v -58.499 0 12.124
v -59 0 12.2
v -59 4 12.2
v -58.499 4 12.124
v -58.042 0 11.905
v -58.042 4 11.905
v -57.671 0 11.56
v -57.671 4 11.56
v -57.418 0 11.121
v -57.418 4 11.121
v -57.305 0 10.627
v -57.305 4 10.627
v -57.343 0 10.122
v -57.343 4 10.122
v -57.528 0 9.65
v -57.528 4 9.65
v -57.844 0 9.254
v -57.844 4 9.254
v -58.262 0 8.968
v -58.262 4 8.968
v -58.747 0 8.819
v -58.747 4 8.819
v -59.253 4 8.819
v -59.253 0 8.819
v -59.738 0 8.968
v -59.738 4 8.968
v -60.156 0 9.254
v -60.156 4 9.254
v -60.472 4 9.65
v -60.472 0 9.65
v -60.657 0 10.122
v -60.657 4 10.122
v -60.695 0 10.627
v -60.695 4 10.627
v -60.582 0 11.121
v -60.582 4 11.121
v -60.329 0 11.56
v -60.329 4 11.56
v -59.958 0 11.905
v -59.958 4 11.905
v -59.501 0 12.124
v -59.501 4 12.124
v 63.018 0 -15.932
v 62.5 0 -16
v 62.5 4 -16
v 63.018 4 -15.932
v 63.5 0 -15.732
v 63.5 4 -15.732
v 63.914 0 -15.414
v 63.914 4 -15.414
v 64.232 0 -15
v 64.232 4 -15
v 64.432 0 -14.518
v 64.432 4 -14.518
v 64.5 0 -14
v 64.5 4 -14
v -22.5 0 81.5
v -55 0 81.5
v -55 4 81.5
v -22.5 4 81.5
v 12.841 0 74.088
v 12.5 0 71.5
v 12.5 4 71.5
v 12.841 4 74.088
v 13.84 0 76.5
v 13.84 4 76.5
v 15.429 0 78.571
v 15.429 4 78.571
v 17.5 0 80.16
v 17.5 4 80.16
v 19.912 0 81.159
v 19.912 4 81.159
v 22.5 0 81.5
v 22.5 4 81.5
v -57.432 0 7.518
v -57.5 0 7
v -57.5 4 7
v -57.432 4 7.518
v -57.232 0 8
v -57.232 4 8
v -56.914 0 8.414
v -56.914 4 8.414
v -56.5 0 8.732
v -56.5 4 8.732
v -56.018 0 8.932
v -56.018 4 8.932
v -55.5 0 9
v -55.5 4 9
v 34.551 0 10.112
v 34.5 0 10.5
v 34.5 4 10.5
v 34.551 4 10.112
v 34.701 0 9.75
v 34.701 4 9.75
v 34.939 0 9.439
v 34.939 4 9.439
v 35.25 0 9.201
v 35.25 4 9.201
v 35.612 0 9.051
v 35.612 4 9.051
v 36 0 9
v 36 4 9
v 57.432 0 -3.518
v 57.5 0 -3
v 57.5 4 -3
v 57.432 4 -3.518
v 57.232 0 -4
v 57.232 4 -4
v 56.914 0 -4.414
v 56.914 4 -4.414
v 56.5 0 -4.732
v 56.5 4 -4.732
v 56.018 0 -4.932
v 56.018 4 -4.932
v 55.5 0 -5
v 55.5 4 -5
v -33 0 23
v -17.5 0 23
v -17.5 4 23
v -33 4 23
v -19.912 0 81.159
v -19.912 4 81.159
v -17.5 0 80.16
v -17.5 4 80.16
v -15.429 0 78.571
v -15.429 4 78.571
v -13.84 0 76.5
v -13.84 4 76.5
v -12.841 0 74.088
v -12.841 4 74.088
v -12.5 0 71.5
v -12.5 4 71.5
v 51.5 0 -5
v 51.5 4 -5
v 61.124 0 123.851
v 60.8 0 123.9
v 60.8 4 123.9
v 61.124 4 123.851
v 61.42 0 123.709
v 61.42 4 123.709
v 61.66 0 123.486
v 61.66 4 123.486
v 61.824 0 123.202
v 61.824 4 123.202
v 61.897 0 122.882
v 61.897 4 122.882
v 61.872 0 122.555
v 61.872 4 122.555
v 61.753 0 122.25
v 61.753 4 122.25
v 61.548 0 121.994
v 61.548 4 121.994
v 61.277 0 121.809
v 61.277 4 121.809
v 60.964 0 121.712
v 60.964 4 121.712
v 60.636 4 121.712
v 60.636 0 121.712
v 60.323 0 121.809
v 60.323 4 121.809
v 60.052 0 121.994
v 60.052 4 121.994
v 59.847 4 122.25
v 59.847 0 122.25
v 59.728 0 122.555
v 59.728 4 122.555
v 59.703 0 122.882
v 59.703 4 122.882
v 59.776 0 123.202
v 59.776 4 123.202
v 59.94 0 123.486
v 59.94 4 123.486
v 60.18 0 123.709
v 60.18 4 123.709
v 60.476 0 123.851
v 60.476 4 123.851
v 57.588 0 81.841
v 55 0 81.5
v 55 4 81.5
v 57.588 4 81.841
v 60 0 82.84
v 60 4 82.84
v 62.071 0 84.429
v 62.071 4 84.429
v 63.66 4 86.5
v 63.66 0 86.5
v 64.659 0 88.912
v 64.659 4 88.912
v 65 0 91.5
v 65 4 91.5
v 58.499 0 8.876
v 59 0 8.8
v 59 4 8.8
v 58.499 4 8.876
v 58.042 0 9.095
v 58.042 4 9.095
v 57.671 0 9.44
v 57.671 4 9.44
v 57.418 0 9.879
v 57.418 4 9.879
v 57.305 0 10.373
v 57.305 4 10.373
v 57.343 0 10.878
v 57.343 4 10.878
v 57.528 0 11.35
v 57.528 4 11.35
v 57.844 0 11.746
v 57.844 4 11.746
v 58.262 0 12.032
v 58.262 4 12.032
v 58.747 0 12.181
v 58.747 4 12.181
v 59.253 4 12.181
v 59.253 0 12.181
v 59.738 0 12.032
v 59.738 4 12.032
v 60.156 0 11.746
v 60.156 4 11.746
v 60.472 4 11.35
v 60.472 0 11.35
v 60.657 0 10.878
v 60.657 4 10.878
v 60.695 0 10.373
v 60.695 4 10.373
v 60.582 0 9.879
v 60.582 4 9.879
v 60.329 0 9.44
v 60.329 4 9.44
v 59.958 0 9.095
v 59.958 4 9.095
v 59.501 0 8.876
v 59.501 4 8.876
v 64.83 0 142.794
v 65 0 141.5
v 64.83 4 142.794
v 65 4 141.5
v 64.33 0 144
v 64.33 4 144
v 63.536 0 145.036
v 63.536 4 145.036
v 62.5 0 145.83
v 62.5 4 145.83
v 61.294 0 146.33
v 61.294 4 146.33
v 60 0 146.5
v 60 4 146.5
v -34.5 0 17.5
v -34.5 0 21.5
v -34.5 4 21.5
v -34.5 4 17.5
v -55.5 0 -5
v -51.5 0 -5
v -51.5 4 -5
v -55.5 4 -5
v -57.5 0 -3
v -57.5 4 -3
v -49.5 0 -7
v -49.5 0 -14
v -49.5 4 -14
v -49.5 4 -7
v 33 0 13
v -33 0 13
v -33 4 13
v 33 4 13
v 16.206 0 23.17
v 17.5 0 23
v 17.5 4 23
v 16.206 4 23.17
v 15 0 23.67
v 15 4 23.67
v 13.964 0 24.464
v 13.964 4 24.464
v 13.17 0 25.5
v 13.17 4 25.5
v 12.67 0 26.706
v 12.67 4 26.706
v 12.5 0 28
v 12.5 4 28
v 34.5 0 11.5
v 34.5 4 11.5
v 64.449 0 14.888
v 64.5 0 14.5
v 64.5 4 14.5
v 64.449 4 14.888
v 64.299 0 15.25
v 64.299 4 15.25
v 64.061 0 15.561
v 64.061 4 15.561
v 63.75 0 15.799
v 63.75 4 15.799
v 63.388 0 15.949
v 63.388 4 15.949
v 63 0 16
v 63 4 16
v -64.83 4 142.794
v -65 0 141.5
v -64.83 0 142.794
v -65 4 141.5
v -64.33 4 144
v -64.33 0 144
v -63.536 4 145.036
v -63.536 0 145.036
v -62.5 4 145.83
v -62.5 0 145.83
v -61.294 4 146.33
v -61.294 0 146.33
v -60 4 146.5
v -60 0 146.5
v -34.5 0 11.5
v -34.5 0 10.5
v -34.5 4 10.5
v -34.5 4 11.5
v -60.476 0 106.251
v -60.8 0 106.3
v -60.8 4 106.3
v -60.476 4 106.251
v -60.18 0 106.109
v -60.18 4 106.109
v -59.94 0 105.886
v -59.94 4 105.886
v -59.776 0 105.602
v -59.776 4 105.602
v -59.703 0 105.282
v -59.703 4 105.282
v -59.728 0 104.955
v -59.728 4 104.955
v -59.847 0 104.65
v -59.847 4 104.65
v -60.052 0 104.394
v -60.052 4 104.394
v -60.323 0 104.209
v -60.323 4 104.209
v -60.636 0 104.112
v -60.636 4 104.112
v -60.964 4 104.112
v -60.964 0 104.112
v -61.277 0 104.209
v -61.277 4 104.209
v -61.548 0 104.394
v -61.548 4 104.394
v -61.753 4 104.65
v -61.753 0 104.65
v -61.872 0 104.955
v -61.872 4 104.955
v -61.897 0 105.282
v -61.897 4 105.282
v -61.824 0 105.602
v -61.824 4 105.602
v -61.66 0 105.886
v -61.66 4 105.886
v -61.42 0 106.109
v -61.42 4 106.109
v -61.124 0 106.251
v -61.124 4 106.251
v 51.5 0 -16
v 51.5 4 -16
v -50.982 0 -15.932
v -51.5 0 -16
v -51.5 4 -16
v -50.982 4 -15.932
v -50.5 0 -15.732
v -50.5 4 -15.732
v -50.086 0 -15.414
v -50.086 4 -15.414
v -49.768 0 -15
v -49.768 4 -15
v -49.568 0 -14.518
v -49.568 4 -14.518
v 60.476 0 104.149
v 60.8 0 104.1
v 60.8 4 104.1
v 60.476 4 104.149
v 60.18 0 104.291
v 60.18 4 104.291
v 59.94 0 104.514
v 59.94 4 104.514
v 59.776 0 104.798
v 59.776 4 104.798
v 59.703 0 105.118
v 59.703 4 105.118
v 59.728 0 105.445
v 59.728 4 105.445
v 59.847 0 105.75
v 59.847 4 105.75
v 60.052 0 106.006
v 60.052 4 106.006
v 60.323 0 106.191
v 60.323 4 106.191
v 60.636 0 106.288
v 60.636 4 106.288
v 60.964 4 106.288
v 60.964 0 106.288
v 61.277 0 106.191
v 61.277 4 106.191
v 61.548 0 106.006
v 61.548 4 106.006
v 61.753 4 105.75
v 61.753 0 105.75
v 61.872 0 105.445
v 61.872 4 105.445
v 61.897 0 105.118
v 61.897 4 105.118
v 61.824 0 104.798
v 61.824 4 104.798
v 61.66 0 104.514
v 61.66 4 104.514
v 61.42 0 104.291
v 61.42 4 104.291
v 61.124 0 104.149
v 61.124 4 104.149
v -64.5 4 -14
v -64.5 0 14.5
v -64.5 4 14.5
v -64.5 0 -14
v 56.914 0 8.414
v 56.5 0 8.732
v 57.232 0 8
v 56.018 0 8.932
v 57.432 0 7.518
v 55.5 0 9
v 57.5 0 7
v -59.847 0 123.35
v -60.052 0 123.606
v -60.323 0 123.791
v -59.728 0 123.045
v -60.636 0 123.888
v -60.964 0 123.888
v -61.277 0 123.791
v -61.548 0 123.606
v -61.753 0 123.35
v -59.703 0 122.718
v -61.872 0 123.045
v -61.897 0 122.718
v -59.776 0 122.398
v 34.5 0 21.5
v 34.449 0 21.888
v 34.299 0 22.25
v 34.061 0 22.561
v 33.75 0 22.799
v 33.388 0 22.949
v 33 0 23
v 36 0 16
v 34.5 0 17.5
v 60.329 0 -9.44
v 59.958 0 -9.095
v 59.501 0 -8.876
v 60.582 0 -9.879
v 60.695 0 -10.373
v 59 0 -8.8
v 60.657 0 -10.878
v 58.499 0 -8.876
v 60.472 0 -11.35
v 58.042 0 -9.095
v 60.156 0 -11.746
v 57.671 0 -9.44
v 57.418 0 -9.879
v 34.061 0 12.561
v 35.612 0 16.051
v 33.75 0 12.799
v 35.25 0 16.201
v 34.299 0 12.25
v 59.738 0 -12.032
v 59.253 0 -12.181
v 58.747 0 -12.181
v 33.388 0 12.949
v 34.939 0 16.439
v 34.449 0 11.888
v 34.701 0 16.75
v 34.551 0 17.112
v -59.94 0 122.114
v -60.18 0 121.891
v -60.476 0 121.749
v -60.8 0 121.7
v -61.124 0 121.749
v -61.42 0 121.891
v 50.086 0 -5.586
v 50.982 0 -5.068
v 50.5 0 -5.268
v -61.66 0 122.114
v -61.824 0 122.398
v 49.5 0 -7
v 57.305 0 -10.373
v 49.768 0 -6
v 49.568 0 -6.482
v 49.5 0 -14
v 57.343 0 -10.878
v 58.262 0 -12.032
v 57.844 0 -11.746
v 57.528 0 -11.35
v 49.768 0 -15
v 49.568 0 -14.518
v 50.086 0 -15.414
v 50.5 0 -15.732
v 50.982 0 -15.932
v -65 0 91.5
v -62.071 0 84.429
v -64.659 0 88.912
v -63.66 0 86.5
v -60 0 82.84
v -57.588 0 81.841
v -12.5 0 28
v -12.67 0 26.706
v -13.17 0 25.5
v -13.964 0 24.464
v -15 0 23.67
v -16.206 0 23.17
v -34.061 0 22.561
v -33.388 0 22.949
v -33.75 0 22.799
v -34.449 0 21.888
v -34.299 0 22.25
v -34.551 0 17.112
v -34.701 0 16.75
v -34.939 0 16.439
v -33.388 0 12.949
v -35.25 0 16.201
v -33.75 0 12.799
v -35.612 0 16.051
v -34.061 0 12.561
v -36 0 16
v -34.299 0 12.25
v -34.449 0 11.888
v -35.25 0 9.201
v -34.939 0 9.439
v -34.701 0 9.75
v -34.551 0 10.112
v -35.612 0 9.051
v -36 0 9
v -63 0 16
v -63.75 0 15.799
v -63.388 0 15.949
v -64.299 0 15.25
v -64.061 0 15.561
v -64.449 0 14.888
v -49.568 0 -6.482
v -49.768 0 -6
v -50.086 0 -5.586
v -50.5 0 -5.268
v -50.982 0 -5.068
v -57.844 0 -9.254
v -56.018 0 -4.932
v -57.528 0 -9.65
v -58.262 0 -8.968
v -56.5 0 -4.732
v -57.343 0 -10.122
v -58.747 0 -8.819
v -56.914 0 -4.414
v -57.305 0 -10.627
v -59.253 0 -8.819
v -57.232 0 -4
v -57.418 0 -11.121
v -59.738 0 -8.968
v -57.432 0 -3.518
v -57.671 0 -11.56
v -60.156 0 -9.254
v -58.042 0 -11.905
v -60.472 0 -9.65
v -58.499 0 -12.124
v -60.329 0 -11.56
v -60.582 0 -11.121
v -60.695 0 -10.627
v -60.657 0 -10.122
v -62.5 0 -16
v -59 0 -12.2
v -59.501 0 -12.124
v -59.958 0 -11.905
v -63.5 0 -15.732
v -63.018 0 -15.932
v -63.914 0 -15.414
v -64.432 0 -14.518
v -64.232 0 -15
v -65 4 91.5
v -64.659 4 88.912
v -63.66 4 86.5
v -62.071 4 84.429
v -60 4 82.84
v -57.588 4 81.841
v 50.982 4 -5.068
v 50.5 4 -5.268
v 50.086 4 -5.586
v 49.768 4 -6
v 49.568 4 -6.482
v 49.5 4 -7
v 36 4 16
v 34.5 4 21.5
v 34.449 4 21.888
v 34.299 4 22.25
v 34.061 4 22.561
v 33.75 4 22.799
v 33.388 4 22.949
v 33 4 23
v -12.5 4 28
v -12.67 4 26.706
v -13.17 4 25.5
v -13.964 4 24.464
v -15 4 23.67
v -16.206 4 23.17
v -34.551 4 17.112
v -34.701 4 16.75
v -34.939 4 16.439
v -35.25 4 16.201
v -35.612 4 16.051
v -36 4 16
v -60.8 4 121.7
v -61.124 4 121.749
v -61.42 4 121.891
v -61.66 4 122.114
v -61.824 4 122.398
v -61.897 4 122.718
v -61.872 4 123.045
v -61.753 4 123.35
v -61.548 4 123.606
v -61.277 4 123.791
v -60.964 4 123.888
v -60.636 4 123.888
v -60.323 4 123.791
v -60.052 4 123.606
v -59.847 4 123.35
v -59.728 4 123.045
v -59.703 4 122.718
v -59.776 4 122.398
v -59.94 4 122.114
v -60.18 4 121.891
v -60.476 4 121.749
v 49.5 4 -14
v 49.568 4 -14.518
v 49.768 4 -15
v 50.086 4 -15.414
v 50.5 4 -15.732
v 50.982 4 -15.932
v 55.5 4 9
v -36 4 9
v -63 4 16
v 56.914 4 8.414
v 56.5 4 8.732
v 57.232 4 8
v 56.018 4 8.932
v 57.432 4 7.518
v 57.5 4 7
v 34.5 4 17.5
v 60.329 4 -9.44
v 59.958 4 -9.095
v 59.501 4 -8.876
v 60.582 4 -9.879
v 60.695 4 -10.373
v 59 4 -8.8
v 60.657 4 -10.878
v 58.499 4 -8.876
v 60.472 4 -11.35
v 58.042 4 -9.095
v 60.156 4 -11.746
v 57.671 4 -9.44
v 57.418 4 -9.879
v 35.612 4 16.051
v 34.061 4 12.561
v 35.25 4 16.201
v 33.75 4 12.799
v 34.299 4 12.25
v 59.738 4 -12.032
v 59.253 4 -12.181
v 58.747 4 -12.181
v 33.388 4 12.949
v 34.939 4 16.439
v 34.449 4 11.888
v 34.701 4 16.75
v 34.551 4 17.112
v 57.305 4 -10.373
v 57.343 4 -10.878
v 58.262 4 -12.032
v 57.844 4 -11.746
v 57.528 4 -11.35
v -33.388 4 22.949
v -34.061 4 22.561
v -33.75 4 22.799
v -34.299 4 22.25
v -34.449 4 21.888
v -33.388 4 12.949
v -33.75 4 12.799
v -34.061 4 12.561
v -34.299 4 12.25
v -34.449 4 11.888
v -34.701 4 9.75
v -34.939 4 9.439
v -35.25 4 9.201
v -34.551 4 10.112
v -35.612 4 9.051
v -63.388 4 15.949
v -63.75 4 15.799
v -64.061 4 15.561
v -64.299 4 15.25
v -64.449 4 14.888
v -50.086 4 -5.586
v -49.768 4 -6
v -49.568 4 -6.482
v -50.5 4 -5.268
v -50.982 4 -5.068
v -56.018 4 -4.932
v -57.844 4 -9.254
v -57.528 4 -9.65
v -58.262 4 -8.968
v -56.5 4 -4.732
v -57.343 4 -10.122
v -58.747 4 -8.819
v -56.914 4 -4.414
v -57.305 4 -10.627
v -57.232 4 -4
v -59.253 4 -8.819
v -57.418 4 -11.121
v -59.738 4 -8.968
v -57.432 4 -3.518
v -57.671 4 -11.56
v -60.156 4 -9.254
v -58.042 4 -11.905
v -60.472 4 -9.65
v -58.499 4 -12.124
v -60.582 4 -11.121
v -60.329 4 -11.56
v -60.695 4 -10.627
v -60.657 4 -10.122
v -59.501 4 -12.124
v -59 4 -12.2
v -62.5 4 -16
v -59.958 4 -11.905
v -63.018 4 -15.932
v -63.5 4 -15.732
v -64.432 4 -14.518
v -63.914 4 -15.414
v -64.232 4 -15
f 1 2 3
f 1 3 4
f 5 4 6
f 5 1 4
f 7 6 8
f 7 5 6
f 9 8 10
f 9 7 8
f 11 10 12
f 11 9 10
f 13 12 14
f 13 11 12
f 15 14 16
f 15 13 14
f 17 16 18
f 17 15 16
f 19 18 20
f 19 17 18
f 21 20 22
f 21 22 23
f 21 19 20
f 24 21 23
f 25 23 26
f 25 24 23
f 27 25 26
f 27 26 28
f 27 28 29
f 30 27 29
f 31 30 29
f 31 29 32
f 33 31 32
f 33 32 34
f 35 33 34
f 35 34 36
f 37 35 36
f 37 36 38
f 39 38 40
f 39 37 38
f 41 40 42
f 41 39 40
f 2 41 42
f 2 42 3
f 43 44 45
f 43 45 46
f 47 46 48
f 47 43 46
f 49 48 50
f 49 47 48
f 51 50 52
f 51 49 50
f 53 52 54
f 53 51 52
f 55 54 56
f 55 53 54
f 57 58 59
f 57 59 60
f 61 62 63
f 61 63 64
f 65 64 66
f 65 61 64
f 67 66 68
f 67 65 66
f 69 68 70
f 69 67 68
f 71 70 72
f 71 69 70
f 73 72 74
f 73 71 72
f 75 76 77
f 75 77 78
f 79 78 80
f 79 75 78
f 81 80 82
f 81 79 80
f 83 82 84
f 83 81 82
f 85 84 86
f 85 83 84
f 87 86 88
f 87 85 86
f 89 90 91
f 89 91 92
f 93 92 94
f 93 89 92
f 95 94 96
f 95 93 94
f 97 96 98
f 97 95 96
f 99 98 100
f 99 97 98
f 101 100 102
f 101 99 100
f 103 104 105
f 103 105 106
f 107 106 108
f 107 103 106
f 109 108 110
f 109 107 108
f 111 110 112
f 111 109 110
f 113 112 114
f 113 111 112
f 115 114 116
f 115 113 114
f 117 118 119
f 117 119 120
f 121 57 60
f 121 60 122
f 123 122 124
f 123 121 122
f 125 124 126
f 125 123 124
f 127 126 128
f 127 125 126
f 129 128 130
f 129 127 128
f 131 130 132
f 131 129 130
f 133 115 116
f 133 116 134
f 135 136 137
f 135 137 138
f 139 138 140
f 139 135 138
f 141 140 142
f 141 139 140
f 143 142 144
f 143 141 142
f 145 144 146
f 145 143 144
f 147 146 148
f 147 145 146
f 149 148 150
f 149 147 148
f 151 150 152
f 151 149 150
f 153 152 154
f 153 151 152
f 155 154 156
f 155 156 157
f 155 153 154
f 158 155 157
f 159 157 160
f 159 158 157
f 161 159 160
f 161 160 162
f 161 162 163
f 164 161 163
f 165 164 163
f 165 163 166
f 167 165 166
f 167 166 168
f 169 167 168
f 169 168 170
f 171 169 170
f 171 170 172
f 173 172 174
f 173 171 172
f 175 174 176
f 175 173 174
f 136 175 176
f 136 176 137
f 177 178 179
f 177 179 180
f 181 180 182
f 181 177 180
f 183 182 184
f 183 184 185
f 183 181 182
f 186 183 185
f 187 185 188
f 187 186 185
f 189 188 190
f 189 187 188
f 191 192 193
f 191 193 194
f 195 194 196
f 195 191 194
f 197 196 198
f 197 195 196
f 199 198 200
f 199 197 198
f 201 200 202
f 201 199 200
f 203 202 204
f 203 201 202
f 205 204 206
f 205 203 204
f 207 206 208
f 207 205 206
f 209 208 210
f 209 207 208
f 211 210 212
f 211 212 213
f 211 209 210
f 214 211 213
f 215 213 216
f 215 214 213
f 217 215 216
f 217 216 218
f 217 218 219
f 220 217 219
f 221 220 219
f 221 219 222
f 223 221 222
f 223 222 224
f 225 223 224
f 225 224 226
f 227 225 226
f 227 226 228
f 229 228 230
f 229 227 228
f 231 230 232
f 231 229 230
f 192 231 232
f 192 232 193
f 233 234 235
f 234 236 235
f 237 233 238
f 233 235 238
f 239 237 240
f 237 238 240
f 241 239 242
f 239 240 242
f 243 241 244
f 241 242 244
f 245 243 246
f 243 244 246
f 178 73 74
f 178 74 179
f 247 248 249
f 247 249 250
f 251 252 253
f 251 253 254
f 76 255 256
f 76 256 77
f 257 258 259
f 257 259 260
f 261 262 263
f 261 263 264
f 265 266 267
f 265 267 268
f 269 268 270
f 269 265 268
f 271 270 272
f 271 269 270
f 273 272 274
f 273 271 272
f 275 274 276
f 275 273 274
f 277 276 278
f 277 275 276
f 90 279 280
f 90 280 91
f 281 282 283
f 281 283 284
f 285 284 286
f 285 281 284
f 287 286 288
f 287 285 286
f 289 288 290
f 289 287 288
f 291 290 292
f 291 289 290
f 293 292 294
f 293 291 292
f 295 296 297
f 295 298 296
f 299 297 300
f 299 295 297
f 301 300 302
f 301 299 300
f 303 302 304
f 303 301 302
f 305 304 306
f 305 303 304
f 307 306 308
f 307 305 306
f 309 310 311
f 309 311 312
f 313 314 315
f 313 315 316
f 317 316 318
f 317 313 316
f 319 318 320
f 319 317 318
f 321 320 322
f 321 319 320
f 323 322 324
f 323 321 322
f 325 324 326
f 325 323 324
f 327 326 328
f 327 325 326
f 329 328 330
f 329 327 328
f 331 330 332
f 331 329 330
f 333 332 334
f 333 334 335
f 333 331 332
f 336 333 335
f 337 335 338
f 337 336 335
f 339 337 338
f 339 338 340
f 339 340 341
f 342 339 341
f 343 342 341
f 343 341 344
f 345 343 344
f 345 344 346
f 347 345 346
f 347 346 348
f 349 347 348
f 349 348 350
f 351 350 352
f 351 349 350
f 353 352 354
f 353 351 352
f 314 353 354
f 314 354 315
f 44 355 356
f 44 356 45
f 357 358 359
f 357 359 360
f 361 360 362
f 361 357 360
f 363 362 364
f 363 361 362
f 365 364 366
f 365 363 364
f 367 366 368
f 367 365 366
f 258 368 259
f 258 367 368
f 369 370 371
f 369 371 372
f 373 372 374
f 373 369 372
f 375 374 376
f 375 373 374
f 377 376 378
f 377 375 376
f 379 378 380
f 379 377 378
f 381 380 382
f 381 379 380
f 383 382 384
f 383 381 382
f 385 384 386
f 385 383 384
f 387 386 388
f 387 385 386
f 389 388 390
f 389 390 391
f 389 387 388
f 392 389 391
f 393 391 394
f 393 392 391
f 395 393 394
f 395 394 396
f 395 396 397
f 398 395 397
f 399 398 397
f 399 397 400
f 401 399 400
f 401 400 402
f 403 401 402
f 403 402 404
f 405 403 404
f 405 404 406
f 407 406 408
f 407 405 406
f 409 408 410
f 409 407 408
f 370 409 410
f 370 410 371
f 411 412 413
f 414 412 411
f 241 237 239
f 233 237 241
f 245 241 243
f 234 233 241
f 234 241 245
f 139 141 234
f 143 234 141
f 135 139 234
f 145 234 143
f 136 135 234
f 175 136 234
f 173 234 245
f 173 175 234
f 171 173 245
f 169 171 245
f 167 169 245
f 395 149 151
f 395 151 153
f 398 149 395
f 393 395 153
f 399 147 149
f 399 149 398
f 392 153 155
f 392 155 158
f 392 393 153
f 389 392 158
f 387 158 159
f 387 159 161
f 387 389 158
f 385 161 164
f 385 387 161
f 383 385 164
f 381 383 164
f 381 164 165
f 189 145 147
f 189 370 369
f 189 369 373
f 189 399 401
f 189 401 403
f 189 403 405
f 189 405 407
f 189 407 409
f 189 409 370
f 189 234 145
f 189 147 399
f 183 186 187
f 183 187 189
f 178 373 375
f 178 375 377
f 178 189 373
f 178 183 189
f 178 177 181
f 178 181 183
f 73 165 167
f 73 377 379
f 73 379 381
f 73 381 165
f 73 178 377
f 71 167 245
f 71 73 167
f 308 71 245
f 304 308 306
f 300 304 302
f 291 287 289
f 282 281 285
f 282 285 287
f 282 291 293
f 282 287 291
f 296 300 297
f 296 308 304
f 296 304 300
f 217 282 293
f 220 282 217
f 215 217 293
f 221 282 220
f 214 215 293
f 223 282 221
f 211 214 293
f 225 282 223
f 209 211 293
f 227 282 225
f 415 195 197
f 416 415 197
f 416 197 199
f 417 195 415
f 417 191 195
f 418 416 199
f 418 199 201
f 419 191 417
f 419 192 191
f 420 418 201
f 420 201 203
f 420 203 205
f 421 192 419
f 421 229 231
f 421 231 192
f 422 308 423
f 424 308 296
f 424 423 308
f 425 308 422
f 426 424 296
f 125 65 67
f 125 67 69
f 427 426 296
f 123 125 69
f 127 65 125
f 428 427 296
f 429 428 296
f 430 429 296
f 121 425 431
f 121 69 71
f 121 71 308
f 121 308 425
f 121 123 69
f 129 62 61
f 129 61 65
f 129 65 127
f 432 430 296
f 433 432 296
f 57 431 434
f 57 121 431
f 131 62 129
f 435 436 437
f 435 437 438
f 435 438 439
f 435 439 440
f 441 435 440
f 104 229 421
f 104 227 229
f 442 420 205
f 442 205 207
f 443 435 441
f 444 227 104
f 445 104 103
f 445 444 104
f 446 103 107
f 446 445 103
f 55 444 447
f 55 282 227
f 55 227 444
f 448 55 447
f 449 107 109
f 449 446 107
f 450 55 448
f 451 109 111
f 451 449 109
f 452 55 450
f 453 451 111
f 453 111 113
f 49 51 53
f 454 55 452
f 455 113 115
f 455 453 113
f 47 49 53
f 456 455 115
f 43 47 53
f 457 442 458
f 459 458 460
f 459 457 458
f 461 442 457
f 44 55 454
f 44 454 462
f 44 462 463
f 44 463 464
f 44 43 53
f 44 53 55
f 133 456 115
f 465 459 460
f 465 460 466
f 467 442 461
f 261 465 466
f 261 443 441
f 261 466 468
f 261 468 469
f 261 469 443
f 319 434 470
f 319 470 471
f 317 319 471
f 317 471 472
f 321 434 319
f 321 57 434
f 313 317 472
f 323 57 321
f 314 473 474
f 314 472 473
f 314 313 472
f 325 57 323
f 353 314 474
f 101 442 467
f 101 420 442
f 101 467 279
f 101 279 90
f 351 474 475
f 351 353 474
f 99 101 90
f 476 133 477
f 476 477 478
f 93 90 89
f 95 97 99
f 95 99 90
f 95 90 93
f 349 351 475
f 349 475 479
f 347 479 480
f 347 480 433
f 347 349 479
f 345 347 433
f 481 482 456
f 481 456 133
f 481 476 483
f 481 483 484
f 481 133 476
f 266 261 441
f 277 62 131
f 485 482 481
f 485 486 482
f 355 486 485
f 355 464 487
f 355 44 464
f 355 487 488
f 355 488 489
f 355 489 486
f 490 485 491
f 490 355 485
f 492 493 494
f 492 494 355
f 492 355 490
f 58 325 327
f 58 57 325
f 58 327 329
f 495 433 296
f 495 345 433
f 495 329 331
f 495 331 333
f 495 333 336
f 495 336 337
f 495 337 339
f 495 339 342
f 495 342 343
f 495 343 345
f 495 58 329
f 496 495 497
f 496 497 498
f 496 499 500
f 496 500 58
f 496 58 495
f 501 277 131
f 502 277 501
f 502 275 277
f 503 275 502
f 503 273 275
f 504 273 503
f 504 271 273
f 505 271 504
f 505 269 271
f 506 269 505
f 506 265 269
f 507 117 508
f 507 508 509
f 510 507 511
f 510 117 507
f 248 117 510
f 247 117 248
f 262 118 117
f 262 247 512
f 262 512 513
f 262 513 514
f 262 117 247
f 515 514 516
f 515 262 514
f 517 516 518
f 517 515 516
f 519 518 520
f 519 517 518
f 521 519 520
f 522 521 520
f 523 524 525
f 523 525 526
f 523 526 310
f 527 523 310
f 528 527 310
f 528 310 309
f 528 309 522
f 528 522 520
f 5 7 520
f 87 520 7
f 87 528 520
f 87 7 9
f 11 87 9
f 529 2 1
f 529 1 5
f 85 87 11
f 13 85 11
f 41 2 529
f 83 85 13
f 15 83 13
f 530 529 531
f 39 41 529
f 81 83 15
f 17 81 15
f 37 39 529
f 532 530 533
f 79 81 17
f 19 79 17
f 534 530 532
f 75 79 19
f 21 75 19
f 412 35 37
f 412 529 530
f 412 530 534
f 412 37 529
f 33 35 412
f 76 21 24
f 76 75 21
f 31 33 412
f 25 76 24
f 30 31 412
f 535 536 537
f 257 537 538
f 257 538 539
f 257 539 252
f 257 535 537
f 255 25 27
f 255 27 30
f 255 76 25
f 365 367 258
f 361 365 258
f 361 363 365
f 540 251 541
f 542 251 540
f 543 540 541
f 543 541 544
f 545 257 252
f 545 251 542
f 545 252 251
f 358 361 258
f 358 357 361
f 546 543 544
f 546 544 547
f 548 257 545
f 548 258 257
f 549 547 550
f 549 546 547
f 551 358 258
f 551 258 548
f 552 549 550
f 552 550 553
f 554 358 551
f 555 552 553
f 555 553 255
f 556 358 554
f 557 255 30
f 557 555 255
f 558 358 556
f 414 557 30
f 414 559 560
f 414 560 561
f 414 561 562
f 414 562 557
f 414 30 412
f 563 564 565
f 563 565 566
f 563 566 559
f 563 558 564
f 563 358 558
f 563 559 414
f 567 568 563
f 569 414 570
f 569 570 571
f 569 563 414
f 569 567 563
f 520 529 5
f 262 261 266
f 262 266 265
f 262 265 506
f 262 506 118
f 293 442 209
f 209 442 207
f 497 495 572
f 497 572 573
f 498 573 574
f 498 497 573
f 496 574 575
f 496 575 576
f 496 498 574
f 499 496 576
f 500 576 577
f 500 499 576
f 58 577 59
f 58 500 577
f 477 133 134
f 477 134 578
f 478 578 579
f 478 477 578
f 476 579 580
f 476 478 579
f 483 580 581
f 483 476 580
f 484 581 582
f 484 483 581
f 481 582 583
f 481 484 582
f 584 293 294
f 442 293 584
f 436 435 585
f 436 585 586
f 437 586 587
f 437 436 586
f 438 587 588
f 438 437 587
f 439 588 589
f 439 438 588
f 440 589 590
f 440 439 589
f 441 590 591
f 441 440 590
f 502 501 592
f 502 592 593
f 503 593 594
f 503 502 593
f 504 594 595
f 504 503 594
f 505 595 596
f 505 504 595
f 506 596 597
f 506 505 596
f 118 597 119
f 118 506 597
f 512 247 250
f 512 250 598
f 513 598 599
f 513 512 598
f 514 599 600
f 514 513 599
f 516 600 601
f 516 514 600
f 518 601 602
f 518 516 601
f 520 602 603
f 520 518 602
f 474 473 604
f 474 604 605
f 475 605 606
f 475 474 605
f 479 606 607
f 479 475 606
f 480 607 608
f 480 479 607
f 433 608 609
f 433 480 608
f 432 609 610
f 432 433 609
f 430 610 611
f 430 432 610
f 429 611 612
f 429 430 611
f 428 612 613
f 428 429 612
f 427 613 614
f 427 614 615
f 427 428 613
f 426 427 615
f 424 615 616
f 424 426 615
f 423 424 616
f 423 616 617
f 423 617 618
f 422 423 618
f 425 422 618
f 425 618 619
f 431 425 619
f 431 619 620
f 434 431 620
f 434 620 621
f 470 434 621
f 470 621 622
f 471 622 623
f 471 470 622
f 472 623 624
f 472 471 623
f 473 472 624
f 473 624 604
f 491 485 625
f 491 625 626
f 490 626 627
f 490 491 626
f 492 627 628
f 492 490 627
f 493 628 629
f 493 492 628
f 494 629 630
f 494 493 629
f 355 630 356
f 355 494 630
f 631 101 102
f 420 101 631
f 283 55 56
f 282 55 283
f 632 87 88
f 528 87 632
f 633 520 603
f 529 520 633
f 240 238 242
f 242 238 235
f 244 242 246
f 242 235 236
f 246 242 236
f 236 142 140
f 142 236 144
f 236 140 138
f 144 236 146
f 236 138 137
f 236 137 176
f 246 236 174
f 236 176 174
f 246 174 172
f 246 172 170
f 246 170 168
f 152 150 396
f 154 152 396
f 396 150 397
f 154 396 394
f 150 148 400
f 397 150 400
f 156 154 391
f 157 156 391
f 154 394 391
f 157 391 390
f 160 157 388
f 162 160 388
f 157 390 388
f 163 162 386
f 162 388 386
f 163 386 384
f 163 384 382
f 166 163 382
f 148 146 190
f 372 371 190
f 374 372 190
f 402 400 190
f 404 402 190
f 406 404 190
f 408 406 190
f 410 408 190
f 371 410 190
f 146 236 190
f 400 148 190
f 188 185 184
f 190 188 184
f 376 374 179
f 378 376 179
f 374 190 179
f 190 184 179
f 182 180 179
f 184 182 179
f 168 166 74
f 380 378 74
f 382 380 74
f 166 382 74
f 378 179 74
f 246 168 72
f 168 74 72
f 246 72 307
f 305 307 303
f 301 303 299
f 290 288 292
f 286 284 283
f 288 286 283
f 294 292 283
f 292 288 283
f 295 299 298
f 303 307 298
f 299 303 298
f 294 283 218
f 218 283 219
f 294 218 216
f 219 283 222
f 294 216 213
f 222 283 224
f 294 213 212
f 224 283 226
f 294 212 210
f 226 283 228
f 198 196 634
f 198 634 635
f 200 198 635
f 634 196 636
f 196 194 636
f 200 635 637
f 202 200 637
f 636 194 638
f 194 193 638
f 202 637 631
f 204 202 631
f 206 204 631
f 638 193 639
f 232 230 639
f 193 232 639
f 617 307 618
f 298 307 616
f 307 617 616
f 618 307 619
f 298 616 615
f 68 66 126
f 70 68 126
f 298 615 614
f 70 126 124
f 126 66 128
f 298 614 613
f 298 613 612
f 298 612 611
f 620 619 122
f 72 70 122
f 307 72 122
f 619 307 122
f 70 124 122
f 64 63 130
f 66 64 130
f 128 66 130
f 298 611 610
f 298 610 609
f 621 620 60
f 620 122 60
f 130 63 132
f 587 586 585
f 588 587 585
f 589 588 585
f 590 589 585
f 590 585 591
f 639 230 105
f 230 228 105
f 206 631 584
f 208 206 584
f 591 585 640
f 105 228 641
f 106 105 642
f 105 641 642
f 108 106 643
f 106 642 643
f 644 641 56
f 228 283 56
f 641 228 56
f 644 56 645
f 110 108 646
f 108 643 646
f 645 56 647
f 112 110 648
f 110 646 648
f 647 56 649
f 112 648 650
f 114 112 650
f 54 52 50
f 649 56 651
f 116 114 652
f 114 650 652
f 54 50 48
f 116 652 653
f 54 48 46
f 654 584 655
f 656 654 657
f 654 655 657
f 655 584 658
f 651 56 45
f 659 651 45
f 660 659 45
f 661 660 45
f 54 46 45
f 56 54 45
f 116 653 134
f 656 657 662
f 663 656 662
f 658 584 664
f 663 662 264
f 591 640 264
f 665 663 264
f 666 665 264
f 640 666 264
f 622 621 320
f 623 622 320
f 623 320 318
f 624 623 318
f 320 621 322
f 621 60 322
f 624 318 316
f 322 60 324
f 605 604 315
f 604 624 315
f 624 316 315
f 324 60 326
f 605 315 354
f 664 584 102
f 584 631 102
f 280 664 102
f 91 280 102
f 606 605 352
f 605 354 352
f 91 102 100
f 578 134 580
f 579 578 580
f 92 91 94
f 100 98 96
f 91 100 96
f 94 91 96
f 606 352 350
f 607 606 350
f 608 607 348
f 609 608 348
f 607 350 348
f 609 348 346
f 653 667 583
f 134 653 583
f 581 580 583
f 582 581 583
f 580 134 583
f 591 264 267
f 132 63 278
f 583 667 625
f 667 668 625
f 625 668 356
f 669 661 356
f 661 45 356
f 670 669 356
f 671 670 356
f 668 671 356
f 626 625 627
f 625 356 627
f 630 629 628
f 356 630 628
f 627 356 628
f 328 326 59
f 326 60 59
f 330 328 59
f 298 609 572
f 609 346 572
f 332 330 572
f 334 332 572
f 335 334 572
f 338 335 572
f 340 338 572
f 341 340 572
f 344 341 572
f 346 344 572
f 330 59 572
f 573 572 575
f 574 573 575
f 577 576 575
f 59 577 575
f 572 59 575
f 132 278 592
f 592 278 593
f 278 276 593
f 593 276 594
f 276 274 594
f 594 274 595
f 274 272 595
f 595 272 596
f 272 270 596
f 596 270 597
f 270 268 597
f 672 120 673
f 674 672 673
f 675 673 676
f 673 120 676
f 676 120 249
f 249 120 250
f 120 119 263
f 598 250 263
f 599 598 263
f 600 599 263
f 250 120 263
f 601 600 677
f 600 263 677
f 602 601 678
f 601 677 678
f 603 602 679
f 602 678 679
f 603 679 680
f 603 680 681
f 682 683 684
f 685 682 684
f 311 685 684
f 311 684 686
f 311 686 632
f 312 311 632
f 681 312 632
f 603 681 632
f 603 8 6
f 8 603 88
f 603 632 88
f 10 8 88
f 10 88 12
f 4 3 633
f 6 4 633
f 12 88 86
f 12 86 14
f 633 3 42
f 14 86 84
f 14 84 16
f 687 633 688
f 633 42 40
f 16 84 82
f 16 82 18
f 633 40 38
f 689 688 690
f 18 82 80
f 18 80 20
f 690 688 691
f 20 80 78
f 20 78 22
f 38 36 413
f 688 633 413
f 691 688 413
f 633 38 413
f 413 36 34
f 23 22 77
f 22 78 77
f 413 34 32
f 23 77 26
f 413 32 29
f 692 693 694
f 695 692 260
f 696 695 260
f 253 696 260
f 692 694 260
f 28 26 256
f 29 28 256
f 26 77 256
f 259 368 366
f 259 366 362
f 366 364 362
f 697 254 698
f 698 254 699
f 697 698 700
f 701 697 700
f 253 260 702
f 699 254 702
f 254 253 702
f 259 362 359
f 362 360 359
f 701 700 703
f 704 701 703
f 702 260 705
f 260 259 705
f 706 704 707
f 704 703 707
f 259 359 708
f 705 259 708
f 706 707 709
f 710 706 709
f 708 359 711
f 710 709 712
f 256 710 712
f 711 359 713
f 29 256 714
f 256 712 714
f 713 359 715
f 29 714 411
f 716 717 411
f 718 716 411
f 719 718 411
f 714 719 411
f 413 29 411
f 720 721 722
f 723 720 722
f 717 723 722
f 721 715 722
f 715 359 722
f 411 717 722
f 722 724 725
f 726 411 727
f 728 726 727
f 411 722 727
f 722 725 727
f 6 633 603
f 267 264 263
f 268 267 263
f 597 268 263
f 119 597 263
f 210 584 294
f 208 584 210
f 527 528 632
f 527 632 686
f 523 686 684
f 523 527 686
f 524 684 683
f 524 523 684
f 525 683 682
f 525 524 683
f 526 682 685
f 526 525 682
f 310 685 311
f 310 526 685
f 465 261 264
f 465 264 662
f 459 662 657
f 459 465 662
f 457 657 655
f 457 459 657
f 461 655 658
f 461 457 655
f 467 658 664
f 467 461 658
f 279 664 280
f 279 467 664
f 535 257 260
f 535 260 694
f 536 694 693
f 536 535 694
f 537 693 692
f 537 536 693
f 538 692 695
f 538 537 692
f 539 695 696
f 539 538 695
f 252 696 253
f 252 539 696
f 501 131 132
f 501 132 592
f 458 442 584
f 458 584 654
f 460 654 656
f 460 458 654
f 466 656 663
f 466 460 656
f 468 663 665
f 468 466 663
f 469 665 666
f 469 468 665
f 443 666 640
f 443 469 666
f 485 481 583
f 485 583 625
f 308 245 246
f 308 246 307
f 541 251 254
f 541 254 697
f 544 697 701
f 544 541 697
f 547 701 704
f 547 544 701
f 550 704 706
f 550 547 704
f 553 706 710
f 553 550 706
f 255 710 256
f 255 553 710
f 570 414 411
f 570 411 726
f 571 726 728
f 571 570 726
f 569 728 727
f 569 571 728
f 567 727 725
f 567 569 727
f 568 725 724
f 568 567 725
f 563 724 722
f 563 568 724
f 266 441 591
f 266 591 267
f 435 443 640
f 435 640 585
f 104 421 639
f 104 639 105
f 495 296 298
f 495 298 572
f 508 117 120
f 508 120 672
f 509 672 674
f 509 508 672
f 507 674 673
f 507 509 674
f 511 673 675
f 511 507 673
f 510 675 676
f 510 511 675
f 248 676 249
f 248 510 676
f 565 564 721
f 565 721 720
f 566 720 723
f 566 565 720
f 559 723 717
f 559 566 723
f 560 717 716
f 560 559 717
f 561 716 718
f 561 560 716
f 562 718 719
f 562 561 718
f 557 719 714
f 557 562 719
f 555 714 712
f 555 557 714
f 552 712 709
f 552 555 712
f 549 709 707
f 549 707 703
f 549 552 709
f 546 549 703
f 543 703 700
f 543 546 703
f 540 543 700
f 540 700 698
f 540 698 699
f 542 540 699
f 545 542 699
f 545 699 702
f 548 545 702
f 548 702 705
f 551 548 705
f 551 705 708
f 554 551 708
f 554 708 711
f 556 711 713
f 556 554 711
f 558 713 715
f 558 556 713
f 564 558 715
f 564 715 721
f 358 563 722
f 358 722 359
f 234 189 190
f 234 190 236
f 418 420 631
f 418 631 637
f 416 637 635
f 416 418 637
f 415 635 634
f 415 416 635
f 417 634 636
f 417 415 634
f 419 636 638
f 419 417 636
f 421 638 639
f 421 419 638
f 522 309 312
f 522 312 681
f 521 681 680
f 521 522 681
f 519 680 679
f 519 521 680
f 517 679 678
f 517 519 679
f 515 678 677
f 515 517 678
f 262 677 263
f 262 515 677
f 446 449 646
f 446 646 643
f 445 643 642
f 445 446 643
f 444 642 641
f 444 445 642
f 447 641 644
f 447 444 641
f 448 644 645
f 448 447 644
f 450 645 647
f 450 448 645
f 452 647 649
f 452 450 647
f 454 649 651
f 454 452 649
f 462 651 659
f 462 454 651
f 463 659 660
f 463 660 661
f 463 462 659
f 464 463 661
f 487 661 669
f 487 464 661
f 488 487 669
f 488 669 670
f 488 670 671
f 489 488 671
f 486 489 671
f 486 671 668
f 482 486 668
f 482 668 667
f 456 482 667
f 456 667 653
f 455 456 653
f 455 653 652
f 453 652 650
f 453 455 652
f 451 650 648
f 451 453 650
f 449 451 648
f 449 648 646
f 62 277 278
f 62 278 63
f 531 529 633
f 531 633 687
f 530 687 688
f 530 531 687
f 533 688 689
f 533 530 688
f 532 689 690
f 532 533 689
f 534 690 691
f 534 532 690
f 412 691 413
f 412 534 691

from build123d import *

# Parameters (mm, degrees)
SKETCH2_R           = 1.7
SKETCH2_R_2         = 1.1
BOSS_EXTRUDE1_DEPTH = 4
FILLET1_R           = 5


with BuildPart() as part:
    # Sketch2 → Boss-Extrude1 (new body)
    with BuildSketch(Plane(origin=(0, 0, 0), x_dir=(1, 0, 0), z_dir=(0, 1, 0))):
        with BuildLine():
            Line((-33, -13), (33, -13))
            ThreePointArc((33, -13), (34.060660172, -12.560660172), (34.5, -11.5))
            Line((34.5, -11.5), (34.5, -10.5))
            ThreePointArc((34.5, -10.5), (34.939339828, -9.439339828), (36, -9))
            Line((36, -9), (55.5, -9))
            ThreePointArc((55.5, -9), (56.914213562, -8.414213562), (57.5, -7))
            Line((57.5, -7), (57.5, 3))
            ThreePointArc((57.5, 3), (56.914213562, 4.414213562), (55.5, 5))
            Line((55.5, 5), (51.5, 5))
            ThreePointArc((51.5, 5), (50.085786438, 5.585786438), (49.5, 7))
            Line((49.5, 7), (49.5, 14))
            ThreePointArc((49.5, 14), (50.085786438, 15.414213562), (51.5, 16))
            Line((51.5, 16), (62.5, 16))
            ThreePointArc((62.5, 16), (63.914213562, 15.414213562), (64.5, 14))
            Line((64.5, 14), (64.5, -13))
            Line((64.5, -13), (64.5, -14.5))
            ThreePointArc((64.5, -14.5), (64.060660172, -15.560660172), (63, -16))
            Line((63, -16), (36, -16))
            ThreePointArc((36, -16), (34.939339828, -16.439339828), (34.5, -17.5))
            Line((34.5, -17.5), (34.5, -21.5))
            ThreePointArc((34.5, -21.5), (34.060660172, -22.560660172), (33, -23))
            Line((33, -23), (17.5, -23))
            ThreePointArc((17.5, -23), (13.964466094, -24.464466094), (12.5, -28))
            Line((12.5, -28), (12.5, -56.5))
            Line((12.5, -56.5), (12.5, -71.5))
            ThreePointArc((12.5, -71.5), (15.428932188, -78.571067812), (22.5, -81.5))
            Line((22.5, -81.5), (55, -81.5))
            ThreePointArc((55, -81.5), (62.071067812, -84.428932188), (65, -91.5))
            Line((65, -91.5), (65, -146.5))
            Line((65, -146.5), (-65, -146.5))
            Line((-65, -146.5), (-65, -91.5))
            ThreePointArc((-65, -91.5), (-62.071067812, -84.428932188), (-55, -81.5))
            Line((-55, -81.5), (-25, -81.5))
            Line((-25, -81.5), (-22.5, -81.5))
            ThreePointArc((-22.5, -81.5), (-15.428932188, -78.571067812), (-12.5, -71.5))
            Line((-12.5, -71.5), (-12.5, -56.5))
            Line((-12.5, -56.5), (-12.5, -28))
            ThreePointArc((-12.5, -28), (-13.964466094, -24.464466094), (-17.5, -23))
            Line((-17.5, -23), (-33, -23))
            ThreePointArc((-33, -23), (-34.060660172, -22.560660172), (-34.5, -21.5))
            Line((-34.5, -21.5), (-34.5, -17.5))
            ThreePointArc((-34.5, -17.5), (-34.939339828, -16.439339828), (-36, -16))
            Line((-36, -16), (-63, -16))
            ThreePointArc((-63, -16), (-64.060660172, -15.560660172), (-64.5, -14.5))
            Line((-64.5, -14.5), (-64.5, -13))
            Line((-64.5, -13), (-64.5, 14))
            ThreePointArc((-64.5, 14), (-63.914213562, 15.414213562), (-62.5, 16))
            Line((-62.5, 16), (-51.5, 16))
            ThreePointArc((-51.5, 16), (-50.085786438, 15.414213562), (-49.5, 14))
            Line((-49.5, 14), (-49.5, 7))
            ThreePointArc((-49.5, 7), (-50.085786438, 5.585786438), (-51.5, 5))
            Line((-51.5, 5), (-55.5, 5))
            ThreePointArc((-55.5, 5), (-56.914213562, 4.414213562), (-57.5, 3))
            Line((-57.5, 3), (-57.5, -7))
            ThreePointArc((-57.5, -7), (-56.914213562, -8.414213562), (-55.5, -9))
            Line((-55.5, -9), (-36, -9))
            ThreePointArc((-36, -9), (-34.939339828, -9.439339828), (-34.5, -10.5))
            Line((-34.5, -10.5), (-34.5, -11.5))
            ThreePointArc((-34.5, -11.5), (-34.060660172, -12.560660172), (-33, -13))
        make_face()
        with Locations(Location((59, 10.5, 0), (0, 0, 270))):
            Circle(SKETCH2_R, mode=Mode.SUBTRACT)
        with Locations(Location((-59, 10.5, 0), (0, 0, 90))):
            Circle(SKETCH2_R, mode=Mode.SUBTRACT)
        with Locations(Location((-59, -10.5, 0), (0, 0, 270))):
            Circle(SKETCH2_R, mode=Mode.SUBTRACT)
        with Locations(Location((59, -10.5, 0), (0, 0, 90))):
            Circle(SKETCH2_R, mode=Mode.SUBTRACT)
        with Locations(Location((-60.8, -105.2, 0), (0, 0, 270))):
            Circle(SKETCH2_R_2, mode=Mode.SUBTRACT)
        with Locations(Location((-60.8, -122.8, 0), (0, 0, 90))):
            Circle(SKETCH2_R_2, mode=Mode.SUBTRACT)
        with Locations(Location((60.8, -122.8, 0), (0, 0, 270))):
            Circle(SKETCH2_R_2, mode=Mode.SUBTRACT)
        with Locations(Location((60.8, -105.2, 0), (0, 0, 90))):
            Circle(SKETCH2_R_2, mode=Mode.SUBTRACT)
    extrude(amount=BOSS_EXTRUDE1_DEPTH)

    # Fillet1
    fillet1_edges = [part.edges().sort_by_distance(p)[0] for p in [
        (65, 2, 146.5),
        (-65, 2, 146.5),
    ]]
    fillet(fillet1_edges, radius=FILLET1_R)


solid = part.part
